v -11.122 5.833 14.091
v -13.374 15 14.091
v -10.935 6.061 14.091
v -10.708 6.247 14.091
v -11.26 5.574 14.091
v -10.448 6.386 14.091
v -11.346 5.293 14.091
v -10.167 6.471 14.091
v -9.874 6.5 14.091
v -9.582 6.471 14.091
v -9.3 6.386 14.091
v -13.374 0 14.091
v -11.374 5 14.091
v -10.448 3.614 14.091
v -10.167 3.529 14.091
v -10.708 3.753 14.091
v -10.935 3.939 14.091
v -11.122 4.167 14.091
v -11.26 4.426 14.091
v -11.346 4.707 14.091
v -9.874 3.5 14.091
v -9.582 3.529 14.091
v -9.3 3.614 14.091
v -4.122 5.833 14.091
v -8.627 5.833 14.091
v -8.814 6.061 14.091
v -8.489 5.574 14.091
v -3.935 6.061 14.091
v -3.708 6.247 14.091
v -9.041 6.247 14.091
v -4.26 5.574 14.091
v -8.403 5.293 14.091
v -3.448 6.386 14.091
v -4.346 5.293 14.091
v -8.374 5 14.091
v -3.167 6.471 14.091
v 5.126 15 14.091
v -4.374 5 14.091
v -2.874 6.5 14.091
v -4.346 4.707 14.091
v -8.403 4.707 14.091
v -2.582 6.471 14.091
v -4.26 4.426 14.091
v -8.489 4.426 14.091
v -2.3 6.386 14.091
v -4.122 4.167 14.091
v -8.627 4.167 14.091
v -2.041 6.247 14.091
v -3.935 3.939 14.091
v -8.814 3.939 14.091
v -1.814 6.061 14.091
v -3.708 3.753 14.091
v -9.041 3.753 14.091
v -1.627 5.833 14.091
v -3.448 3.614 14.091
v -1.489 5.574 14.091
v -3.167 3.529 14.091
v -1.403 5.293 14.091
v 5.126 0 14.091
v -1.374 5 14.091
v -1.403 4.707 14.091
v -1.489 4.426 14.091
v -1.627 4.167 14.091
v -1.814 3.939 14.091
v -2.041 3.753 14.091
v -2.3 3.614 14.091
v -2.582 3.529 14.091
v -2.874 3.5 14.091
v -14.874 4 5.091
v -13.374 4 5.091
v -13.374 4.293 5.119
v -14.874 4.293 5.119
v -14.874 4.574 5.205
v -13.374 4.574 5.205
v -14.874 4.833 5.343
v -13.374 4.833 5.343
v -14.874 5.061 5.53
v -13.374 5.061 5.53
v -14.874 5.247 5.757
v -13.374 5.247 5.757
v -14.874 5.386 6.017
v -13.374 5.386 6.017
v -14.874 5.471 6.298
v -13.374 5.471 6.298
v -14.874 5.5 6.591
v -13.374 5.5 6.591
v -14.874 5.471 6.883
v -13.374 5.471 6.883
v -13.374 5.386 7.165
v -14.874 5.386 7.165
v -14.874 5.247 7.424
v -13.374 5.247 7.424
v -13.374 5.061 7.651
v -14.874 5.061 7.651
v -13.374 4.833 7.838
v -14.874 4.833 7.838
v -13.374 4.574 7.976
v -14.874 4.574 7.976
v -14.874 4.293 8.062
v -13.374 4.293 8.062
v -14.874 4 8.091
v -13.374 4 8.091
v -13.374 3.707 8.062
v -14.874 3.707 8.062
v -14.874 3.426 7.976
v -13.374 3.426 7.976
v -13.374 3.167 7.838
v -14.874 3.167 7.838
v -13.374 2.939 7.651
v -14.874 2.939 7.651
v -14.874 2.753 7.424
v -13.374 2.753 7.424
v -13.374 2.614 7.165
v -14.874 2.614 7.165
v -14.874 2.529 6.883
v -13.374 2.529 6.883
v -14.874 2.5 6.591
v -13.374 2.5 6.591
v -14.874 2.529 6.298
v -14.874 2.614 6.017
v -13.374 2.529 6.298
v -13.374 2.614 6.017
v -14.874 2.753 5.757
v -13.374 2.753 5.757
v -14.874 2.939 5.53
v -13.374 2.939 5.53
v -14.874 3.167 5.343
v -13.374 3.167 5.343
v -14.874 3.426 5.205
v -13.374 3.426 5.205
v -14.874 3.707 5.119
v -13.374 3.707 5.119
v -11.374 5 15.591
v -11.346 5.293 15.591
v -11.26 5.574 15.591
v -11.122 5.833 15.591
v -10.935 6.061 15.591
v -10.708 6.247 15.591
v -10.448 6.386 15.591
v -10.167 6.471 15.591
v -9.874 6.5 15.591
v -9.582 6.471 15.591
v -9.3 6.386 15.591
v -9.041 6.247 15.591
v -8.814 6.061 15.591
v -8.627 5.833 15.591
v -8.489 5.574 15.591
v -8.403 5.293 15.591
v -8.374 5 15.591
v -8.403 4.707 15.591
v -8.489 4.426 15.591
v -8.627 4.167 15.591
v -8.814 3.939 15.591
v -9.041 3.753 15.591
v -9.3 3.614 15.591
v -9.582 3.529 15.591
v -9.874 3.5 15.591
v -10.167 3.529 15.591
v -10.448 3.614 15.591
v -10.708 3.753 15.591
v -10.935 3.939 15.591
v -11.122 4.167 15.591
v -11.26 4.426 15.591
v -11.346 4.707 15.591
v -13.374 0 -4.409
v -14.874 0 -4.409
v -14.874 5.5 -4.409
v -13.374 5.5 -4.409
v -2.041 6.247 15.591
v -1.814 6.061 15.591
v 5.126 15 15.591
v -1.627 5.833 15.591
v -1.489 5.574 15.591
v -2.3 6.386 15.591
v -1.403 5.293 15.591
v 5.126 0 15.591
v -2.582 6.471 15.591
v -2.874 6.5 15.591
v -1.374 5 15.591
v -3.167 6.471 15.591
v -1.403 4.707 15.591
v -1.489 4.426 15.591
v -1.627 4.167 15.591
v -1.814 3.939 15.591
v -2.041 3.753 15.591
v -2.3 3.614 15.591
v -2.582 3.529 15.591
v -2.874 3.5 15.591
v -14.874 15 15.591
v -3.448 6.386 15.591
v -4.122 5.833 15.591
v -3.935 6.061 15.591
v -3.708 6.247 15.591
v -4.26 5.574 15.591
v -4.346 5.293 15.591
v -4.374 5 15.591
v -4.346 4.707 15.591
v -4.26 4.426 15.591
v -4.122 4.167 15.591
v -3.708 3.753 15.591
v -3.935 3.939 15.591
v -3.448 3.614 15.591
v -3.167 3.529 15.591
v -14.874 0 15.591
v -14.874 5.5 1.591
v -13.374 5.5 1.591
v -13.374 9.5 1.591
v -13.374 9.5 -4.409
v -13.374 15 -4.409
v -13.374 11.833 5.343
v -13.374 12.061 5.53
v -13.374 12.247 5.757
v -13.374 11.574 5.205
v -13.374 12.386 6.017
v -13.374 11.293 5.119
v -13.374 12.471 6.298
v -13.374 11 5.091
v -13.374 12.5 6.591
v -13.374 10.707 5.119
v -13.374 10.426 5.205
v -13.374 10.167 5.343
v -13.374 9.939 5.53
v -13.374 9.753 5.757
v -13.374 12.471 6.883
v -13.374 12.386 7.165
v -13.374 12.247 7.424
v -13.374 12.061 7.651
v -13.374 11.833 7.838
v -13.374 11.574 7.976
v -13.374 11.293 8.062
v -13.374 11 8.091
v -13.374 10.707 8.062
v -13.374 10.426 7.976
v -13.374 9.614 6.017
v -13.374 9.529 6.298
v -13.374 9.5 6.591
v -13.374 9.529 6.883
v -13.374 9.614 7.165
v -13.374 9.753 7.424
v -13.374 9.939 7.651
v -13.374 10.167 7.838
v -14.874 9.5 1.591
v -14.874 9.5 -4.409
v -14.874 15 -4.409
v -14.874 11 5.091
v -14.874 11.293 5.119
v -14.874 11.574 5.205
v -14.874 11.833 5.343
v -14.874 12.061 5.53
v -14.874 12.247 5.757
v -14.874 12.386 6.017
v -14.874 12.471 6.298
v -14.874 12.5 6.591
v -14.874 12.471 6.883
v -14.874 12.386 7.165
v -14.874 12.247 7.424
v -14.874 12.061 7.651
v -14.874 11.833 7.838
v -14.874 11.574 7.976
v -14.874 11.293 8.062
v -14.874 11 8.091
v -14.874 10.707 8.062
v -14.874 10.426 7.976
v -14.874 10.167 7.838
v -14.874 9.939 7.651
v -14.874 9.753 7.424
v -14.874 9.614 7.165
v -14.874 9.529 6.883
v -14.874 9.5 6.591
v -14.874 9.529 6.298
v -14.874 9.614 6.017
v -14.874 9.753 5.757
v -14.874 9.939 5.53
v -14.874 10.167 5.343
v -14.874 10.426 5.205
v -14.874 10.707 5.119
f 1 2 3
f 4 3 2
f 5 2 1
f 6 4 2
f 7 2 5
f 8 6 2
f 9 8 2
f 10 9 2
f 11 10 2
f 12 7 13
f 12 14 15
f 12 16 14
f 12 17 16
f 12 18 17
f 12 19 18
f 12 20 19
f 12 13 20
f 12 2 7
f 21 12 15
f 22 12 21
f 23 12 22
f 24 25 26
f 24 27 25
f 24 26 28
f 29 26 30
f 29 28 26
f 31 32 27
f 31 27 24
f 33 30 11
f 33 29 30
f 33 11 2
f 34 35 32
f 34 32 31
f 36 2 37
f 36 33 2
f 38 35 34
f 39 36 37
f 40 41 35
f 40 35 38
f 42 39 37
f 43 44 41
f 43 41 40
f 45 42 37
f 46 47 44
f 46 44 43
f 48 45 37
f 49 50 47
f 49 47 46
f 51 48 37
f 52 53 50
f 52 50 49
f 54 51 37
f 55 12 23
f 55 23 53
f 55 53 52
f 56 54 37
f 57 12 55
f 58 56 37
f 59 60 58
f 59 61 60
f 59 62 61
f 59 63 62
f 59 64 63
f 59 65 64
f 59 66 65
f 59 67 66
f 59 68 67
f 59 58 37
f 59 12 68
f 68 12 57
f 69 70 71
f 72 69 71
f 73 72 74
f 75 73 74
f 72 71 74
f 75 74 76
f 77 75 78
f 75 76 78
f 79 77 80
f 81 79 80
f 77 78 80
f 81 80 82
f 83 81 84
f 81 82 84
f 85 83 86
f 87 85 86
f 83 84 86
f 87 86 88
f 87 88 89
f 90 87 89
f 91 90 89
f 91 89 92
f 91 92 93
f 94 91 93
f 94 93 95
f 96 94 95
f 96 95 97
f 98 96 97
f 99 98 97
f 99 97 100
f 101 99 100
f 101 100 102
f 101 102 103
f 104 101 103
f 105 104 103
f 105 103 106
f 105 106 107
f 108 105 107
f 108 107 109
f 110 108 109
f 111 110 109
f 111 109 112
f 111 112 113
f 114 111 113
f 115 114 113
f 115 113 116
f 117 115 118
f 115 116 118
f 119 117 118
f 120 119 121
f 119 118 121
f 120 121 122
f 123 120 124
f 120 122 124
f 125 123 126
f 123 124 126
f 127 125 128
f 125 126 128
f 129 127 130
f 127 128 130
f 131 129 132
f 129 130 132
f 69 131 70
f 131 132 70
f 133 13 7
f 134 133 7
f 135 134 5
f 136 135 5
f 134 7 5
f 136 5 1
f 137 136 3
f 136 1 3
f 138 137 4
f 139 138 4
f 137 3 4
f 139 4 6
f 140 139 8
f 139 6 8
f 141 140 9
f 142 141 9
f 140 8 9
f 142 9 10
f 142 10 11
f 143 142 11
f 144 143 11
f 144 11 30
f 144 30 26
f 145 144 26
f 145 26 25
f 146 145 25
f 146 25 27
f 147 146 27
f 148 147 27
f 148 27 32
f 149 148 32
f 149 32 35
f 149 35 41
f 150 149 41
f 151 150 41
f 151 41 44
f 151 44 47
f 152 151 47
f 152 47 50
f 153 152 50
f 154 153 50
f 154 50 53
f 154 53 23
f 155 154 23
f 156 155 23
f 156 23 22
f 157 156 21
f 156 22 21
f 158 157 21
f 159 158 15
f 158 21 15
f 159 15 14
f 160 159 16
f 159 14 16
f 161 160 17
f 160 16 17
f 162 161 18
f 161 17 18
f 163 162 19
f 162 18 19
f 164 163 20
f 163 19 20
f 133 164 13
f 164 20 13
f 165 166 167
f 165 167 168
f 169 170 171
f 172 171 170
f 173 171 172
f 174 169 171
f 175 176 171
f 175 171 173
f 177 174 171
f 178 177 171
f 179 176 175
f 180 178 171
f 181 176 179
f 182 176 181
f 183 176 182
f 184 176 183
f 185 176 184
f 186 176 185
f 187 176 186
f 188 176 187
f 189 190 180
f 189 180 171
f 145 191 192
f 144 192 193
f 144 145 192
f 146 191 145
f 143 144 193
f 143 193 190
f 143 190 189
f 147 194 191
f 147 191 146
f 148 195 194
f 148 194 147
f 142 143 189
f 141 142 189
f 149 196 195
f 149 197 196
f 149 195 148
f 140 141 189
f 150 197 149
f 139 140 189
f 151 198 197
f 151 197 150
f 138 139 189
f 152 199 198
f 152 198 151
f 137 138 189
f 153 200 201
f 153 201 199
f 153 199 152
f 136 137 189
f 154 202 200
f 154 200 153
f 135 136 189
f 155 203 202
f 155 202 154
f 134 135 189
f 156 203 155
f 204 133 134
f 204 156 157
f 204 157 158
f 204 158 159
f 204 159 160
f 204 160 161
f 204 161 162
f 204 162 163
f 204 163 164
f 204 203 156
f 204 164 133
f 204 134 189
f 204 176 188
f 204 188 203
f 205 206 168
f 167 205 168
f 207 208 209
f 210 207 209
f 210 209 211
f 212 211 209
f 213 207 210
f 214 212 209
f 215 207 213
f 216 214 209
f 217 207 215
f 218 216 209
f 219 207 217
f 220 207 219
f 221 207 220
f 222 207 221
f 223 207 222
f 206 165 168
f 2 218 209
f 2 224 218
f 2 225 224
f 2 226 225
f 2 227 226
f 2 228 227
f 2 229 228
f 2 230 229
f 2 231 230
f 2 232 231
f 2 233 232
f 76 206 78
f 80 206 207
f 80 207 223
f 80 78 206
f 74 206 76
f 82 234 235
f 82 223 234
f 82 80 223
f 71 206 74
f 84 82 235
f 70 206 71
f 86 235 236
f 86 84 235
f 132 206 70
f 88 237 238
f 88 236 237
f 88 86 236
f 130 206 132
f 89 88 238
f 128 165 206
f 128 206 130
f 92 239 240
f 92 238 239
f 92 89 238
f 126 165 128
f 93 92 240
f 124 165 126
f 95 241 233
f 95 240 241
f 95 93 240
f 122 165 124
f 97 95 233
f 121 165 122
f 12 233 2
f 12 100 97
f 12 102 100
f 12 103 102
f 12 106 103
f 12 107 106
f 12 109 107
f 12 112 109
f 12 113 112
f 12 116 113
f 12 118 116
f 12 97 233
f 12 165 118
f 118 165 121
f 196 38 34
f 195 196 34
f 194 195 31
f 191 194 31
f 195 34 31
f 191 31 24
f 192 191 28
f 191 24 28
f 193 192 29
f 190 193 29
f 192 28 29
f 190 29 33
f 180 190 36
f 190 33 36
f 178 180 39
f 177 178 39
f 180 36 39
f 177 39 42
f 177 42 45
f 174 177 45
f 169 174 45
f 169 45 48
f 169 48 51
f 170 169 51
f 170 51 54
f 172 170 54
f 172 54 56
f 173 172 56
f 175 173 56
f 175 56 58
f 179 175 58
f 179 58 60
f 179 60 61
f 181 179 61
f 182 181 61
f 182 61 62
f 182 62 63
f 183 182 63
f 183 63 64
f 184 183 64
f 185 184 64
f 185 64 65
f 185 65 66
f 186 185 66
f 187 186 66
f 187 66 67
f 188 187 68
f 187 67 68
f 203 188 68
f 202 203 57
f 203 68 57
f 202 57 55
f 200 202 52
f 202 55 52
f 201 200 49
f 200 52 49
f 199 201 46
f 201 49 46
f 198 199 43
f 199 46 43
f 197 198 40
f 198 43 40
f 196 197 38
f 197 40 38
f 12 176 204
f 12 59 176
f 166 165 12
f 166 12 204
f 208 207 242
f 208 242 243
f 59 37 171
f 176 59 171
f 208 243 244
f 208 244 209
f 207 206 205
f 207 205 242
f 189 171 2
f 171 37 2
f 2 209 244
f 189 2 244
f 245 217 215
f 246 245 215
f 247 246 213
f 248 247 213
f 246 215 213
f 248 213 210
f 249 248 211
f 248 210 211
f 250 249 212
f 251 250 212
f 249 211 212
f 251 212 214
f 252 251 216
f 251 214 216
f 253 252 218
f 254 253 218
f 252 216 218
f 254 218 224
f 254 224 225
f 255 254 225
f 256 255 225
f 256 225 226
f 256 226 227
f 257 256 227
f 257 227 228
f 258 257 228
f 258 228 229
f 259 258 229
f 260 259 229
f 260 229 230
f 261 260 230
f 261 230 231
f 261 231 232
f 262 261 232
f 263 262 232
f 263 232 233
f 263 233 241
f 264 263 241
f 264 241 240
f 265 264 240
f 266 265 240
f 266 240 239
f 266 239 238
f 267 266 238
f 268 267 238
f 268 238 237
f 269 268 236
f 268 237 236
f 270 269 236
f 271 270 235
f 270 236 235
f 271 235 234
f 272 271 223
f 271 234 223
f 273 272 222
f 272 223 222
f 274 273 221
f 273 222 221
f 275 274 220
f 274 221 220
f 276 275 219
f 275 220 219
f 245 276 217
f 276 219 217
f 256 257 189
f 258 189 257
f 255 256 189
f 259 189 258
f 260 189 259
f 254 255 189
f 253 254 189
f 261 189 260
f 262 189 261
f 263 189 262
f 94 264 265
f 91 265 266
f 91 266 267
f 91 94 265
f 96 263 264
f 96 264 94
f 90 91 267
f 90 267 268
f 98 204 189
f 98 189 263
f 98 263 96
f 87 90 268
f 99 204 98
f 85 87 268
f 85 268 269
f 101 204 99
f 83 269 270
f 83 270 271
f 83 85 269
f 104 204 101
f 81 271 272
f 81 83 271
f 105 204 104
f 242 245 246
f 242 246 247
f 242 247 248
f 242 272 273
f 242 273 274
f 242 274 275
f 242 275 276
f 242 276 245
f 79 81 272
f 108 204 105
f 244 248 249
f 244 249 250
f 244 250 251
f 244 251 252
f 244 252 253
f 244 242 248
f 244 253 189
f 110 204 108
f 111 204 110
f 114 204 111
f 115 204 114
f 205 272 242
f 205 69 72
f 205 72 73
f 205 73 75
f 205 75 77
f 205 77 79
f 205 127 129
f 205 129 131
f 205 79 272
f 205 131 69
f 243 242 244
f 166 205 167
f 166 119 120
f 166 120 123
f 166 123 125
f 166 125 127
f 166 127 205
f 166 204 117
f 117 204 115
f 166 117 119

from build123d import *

# Parameters (mm, degrees)
EXTRUSION1_DEPTH = 15
ESQUISSE3_R      = 1.5
EXTRUSION2_DEPTH = 40
ESQUISSE5_R      = 1.5
ESQUISSE5_W      = 7
ESQUISSE5_H      = 4
EXTRUSION3_DEPTH = 40


with BuildPart() as part:
    # Esquisse1 → Extrusion1 (new body)
    with BuildSketch(Plane(origin=(0, 0, 0), x_dir=(1, 0, 0), z_dir=(0, 1, 0))):
        Polygon((5.12562835, -15.59067149), (-14.87437165, -15.59067149), (-14.87437165, 4.40932851), (-13.37437165, 4.40932851), (-13.37437165, -14.09067149), (5.12562835, -14.09067149), align=None)
    extrude(amount=EXTRUSION1_DEPTH)

    # Esquisse3 → Extrusion2 (cut)
    with BuildSketch(Plane(origin=(0, 0, 14.09067149), x_dir=(-1, 0, 0), z_dir=(0, 0, -1))):
        with Locations((2.87437165, 5)):
            Circle(ESQUISSE3_R)
        with Locations((9.87437165, 5)):
            Circle(ESQUISSE3_R)
    extrude(amount=-EXTRUSION2_DEPTH, mode=Mode.SUBTRACT)

    # Esquisse5 → Extrusion3 (cut)
    with BuildSketch(Plane(origin=(-13.37437165, 0, 0), x_dir=(0, 0, -1), z_dir=(1, 0, 0))):
        with Locations((-6.59067149, 4)):
            Circle(ESQUISSE5_R)
        with Locations((-6.59067149, 11)):
            Circle(ESQUISSE5_R)
        with Locations((1.90932851, 7.5)):
            Rectangle(ESQUISSE5_W, ESQUISSE5_H)
    extrude(amount=-EXTRUSION3_DEPTH, mode=Mode.SUBTRACT)


solid = part.part
